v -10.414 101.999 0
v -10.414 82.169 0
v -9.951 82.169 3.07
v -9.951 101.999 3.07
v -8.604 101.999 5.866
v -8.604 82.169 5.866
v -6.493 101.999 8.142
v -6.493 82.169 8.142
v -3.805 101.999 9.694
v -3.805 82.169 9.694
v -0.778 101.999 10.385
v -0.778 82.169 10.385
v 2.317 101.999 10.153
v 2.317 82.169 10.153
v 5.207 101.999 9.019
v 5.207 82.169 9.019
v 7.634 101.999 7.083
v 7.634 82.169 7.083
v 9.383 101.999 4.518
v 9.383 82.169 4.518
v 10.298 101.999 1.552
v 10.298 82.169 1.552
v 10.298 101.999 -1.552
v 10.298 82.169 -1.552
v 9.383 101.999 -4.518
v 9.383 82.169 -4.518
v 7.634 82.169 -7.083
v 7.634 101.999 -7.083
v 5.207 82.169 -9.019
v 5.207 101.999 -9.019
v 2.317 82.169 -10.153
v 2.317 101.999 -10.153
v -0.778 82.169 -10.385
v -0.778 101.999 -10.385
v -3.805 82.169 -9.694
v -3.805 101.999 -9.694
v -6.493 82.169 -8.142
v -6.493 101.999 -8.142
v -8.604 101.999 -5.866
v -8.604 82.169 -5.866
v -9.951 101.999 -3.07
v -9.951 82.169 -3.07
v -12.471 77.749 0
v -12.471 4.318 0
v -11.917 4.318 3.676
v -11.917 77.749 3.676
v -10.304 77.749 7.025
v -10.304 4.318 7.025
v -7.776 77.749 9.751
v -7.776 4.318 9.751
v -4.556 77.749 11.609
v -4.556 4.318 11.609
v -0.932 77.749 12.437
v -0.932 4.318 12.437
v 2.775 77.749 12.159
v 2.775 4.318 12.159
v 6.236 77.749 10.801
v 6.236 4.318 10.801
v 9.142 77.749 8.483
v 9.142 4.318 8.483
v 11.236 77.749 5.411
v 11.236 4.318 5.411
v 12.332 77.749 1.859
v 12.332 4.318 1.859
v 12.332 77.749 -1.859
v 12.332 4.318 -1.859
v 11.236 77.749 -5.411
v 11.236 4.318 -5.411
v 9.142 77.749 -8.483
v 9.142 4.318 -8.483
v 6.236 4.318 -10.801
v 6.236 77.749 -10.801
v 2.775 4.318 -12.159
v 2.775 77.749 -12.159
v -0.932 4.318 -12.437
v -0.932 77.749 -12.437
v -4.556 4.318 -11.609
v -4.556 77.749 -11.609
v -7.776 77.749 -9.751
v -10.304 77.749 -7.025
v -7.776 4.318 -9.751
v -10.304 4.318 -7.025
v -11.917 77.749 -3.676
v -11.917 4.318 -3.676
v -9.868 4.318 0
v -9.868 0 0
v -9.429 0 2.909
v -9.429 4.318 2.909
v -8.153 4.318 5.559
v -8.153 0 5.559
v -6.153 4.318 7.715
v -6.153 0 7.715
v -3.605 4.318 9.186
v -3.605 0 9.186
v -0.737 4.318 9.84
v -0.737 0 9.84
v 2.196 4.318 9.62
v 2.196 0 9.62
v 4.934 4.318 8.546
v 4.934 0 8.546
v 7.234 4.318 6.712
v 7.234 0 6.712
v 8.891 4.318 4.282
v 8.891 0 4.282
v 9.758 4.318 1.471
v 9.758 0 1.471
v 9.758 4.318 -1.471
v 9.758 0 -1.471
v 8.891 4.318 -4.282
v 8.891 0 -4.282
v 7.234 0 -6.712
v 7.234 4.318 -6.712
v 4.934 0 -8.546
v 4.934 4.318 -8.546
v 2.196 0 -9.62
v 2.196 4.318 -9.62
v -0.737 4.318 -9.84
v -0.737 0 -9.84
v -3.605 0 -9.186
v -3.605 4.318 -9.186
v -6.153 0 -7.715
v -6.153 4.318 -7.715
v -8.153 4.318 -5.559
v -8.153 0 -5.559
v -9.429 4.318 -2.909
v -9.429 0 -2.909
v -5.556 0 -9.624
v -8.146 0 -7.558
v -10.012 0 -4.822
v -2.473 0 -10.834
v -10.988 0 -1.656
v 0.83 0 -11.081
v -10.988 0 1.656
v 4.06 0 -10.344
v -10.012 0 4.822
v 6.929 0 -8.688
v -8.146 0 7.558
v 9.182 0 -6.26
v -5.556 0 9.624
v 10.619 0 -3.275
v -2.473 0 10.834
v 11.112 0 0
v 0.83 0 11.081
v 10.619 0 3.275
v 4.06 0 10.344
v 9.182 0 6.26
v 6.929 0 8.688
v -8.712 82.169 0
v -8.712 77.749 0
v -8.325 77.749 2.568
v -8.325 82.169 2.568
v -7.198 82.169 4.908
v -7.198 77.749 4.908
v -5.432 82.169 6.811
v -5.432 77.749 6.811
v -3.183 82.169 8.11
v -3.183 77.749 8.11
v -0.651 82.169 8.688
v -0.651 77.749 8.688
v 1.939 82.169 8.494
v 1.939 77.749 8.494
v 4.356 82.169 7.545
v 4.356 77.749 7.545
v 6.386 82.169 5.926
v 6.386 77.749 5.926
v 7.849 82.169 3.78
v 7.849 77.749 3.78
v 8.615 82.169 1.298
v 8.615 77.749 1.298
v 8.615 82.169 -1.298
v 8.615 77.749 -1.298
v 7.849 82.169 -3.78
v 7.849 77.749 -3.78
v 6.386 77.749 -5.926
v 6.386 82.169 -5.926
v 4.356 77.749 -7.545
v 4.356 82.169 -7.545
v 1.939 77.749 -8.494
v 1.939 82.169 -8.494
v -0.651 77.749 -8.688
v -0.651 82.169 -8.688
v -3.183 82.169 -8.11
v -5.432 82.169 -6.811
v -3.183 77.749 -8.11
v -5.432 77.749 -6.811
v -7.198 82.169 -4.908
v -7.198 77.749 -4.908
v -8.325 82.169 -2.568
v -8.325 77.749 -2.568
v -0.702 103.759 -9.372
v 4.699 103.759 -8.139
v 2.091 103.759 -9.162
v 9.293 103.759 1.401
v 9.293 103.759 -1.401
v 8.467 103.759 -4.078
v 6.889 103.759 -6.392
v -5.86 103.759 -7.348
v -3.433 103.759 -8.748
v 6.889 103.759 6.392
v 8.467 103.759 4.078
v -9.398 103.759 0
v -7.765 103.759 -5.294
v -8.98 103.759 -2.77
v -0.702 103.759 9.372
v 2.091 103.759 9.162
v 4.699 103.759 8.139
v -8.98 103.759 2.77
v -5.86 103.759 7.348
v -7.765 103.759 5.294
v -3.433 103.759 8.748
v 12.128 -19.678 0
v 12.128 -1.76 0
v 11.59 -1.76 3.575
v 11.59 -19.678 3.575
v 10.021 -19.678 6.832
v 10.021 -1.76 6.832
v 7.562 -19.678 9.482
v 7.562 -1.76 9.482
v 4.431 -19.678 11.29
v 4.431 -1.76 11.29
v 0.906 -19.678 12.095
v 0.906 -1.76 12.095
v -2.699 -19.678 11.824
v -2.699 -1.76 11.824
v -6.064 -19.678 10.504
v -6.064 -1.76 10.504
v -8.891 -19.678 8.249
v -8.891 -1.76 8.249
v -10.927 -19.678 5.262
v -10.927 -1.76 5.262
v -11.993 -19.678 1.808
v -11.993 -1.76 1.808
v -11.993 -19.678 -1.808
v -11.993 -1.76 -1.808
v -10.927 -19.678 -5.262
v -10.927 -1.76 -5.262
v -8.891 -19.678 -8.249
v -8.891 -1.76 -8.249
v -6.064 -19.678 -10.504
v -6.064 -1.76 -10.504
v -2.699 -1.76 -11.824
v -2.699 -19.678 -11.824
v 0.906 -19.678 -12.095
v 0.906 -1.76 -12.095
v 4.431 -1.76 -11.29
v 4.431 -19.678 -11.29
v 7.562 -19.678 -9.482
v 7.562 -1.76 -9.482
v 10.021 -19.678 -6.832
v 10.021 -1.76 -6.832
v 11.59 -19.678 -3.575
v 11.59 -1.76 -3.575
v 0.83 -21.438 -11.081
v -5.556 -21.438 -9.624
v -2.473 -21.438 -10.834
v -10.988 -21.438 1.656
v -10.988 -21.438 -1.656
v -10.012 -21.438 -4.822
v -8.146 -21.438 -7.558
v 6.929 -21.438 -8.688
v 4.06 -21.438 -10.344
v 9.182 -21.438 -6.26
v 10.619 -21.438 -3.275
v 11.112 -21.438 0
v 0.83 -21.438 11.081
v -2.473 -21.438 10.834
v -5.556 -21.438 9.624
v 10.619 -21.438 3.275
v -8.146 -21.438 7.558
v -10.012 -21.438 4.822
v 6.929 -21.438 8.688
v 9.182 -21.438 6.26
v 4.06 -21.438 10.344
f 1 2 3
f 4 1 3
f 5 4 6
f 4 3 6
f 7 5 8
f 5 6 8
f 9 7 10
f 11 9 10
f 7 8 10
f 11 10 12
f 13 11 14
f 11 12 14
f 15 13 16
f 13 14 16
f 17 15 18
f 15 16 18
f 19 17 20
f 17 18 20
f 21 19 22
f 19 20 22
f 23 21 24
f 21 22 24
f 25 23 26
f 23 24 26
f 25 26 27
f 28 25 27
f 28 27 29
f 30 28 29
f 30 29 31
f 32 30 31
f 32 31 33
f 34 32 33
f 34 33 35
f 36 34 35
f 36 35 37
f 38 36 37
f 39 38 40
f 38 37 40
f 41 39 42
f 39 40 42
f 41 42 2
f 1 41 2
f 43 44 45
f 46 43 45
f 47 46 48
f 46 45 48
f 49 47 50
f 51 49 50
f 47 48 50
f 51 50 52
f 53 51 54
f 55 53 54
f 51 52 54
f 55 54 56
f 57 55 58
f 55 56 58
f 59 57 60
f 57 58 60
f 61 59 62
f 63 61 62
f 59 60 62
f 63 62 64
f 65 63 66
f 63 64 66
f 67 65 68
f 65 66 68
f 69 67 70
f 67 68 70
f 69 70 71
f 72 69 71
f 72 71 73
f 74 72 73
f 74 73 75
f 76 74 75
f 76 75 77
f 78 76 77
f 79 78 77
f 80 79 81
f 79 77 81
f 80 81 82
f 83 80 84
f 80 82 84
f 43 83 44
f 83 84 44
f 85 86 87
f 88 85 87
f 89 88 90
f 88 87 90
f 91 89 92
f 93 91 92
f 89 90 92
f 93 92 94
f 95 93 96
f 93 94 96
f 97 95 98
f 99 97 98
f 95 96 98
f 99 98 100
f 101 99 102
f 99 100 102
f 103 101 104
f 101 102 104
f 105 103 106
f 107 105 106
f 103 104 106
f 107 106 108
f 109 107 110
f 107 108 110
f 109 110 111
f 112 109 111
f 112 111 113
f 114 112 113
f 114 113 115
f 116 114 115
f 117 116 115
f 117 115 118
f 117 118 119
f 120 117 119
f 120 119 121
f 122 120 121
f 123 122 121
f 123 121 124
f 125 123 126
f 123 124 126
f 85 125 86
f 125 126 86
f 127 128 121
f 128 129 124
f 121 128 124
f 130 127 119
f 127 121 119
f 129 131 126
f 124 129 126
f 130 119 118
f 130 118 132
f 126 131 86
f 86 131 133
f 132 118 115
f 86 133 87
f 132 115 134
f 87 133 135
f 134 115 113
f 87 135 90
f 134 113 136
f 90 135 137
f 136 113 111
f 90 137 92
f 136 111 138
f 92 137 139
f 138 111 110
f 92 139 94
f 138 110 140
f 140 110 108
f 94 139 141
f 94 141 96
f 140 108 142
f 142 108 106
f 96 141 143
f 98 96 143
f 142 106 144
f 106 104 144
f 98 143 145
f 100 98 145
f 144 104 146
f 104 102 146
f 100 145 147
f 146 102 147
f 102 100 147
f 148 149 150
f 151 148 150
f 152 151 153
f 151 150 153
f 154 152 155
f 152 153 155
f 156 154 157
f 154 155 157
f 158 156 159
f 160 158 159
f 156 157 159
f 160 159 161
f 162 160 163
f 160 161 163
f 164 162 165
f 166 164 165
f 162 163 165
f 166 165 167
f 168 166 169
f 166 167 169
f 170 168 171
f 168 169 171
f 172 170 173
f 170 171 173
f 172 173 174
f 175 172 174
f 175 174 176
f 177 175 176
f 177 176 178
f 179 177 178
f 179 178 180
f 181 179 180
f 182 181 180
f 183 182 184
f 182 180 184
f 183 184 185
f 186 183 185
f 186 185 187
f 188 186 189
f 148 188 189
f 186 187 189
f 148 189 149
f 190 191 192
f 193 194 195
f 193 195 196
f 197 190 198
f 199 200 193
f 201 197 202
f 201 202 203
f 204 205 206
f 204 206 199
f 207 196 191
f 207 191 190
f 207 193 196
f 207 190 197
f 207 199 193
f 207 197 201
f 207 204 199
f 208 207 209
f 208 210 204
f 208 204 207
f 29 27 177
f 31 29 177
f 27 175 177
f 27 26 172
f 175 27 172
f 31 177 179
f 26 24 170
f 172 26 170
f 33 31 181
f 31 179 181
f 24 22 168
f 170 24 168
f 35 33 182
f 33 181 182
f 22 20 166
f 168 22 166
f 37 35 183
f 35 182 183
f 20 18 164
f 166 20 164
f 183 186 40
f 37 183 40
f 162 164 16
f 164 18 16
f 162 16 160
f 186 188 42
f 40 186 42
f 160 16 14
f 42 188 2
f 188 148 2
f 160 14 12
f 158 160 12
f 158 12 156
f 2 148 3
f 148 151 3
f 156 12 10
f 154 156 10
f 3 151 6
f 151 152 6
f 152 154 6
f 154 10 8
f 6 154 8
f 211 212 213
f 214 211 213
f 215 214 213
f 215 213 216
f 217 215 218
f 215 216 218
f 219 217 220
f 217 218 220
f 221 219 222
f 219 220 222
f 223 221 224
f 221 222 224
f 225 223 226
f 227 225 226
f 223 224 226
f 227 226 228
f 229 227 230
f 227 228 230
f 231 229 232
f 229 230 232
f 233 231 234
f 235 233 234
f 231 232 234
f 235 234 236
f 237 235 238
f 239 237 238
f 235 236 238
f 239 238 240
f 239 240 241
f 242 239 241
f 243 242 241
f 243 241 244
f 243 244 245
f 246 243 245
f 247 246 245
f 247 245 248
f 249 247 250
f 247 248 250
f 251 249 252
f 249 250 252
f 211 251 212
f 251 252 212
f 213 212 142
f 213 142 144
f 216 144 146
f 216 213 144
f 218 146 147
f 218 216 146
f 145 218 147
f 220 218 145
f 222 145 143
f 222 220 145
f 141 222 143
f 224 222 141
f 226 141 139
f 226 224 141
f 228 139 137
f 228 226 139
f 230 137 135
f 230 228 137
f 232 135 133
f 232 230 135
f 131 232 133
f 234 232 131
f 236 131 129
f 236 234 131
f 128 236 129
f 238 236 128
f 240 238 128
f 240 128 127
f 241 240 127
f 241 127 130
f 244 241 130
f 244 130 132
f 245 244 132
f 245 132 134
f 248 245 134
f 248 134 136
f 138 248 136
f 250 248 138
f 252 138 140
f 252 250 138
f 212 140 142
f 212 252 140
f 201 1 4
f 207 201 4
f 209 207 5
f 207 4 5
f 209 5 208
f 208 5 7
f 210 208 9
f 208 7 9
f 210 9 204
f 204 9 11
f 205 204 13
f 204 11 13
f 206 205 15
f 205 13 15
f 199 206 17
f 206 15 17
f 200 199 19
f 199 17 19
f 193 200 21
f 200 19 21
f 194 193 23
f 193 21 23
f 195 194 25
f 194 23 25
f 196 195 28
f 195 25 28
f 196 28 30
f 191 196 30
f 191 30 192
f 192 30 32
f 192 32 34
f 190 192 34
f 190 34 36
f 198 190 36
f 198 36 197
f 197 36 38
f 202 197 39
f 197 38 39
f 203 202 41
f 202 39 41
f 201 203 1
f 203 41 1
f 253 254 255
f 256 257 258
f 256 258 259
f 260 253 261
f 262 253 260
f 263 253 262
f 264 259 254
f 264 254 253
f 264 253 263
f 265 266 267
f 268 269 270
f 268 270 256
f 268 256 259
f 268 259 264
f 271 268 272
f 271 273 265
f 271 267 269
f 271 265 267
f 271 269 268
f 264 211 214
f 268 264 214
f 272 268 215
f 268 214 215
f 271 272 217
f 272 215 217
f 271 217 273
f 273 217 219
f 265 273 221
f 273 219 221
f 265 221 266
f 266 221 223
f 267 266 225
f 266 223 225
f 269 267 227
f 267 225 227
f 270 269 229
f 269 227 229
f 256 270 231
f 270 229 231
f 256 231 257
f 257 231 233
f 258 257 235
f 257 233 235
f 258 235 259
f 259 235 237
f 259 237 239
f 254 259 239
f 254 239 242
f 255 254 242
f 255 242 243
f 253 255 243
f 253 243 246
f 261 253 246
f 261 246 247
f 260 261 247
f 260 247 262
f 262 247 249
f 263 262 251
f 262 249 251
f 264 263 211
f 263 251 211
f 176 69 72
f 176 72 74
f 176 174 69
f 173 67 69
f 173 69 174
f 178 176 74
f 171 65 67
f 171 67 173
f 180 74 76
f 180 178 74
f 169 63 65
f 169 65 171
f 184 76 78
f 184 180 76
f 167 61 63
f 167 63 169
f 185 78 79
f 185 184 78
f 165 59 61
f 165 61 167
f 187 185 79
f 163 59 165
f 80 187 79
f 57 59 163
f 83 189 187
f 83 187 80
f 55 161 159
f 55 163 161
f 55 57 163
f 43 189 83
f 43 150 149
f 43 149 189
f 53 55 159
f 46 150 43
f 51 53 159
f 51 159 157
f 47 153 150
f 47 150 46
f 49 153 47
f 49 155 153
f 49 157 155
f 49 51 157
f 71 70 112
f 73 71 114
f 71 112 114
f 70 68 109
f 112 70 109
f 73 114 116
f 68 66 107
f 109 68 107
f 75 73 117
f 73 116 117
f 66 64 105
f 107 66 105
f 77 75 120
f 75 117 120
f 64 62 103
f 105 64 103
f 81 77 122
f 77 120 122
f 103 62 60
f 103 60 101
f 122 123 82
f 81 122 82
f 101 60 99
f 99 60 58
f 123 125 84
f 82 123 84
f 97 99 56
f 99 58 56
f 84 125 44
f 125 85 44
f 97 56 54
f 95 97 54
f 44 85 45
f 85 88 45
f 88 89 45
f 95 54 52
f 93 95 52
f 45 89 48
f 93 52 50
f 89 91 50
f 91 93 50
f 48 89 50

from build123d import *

# Parameters (mm, degrees)
F0_R       = 12.1285
F1_DEPTH   = 21.4376
F2_SIZE2   = 1.7597636205
F2_SIZE    = 1.016
F2_2_SIZE2 = 1.7597636205
F2_2_SIZE  = 1.016
F3_R       = 9.8679
F4_DEPTH   = 4.318
F5_R       = 12.4714
F6_DEPTH   = 73.4314
F7_R       = 8.7122
F8_DEPTH   = 4.4196
F9_R       = 10.414
F10_DEPTH  = 21.59
F11_SIZE2  = 1.7597636205
F11_SIZE   = 1.016


with BuildPart() as f1:
    # F0 (on Front) → F1 (new body)
    with BuildSketch(Plane.XZ):
        Circle(F0_R)
    extrude(amount=F1_DEPTH)

    # F2
    f2_edges = [f1.edges().sort_by_distance(p)[0] for p in [
        (-12.1285, -21.4376, 0),
    ]]
    f2_side = f1.faces().sort_by_distance((0, -21.4376, 0))[0]
    chamfer(f2_edges, length=F2_SIZE, length2=F2_SIZE2, reference=f2_side)

    # F2#2
    f2_2_edges = [f1.edges().sort_by_distance(p)[0] for p in [
        (-12.1285, 0, 0),
    ]]
    f2_2_side = f1.faces().sort_by_distance((0, 0, 0))[0]
    chamfer(f2_2_edges, length=F2_2_SIZE, length2=F2_2_SIZE2, reference=f2_2_side)

    # F3 (on face) → F4 (join)
    with BuildSketch(Plane(origin=(0, 0, 0), x_dir=(-1, 0, 0), z_dir=(0, 1, 0))):
        Circle(F3_R)
    extrude(amount=F4_DEPTH)

    # F5 (on face) → F6 (join)
    with BuildSketch(Plane(origin=(0, 4.318, 0), x_dir=(-1, 0, 0), z_dir=(0, 1, 0))):
        Circle(F5_R)
    extrude(amount=F6_DEPTH)

    # F7 (on face) → F8 (join)
    with BuildSketch(Plane(origin=(0, 77.7494, 0), x_dir=(-1, 0, 0), z_dir=(0, 1, 0))):
        Circle(F7_R)
    extrude(amount=F8_DEPTH)

    # F9 (on face) → F10 (join)
    with BuildSketch(Plane(origin=(0, 82.169, 0), x_dir=(-1, 0, 0), z_dir=(0, 1, 0))):
        Circle(F9_R)
    extrude(amount=F10_DEPTH)

    # F11
    f11_edges = [f1.edges().sort_by_distance(p)[0] for p in [
        (10.414, 103.759, 0),
    ]]
    f11_side = f1.faces().sort_by_distance((0, 103.759, 0))[0]
    chamfer(f11_edges, length=F11_SIZE, length2=F11_SIZE2, reference=f11_side)


solid = f1.part
